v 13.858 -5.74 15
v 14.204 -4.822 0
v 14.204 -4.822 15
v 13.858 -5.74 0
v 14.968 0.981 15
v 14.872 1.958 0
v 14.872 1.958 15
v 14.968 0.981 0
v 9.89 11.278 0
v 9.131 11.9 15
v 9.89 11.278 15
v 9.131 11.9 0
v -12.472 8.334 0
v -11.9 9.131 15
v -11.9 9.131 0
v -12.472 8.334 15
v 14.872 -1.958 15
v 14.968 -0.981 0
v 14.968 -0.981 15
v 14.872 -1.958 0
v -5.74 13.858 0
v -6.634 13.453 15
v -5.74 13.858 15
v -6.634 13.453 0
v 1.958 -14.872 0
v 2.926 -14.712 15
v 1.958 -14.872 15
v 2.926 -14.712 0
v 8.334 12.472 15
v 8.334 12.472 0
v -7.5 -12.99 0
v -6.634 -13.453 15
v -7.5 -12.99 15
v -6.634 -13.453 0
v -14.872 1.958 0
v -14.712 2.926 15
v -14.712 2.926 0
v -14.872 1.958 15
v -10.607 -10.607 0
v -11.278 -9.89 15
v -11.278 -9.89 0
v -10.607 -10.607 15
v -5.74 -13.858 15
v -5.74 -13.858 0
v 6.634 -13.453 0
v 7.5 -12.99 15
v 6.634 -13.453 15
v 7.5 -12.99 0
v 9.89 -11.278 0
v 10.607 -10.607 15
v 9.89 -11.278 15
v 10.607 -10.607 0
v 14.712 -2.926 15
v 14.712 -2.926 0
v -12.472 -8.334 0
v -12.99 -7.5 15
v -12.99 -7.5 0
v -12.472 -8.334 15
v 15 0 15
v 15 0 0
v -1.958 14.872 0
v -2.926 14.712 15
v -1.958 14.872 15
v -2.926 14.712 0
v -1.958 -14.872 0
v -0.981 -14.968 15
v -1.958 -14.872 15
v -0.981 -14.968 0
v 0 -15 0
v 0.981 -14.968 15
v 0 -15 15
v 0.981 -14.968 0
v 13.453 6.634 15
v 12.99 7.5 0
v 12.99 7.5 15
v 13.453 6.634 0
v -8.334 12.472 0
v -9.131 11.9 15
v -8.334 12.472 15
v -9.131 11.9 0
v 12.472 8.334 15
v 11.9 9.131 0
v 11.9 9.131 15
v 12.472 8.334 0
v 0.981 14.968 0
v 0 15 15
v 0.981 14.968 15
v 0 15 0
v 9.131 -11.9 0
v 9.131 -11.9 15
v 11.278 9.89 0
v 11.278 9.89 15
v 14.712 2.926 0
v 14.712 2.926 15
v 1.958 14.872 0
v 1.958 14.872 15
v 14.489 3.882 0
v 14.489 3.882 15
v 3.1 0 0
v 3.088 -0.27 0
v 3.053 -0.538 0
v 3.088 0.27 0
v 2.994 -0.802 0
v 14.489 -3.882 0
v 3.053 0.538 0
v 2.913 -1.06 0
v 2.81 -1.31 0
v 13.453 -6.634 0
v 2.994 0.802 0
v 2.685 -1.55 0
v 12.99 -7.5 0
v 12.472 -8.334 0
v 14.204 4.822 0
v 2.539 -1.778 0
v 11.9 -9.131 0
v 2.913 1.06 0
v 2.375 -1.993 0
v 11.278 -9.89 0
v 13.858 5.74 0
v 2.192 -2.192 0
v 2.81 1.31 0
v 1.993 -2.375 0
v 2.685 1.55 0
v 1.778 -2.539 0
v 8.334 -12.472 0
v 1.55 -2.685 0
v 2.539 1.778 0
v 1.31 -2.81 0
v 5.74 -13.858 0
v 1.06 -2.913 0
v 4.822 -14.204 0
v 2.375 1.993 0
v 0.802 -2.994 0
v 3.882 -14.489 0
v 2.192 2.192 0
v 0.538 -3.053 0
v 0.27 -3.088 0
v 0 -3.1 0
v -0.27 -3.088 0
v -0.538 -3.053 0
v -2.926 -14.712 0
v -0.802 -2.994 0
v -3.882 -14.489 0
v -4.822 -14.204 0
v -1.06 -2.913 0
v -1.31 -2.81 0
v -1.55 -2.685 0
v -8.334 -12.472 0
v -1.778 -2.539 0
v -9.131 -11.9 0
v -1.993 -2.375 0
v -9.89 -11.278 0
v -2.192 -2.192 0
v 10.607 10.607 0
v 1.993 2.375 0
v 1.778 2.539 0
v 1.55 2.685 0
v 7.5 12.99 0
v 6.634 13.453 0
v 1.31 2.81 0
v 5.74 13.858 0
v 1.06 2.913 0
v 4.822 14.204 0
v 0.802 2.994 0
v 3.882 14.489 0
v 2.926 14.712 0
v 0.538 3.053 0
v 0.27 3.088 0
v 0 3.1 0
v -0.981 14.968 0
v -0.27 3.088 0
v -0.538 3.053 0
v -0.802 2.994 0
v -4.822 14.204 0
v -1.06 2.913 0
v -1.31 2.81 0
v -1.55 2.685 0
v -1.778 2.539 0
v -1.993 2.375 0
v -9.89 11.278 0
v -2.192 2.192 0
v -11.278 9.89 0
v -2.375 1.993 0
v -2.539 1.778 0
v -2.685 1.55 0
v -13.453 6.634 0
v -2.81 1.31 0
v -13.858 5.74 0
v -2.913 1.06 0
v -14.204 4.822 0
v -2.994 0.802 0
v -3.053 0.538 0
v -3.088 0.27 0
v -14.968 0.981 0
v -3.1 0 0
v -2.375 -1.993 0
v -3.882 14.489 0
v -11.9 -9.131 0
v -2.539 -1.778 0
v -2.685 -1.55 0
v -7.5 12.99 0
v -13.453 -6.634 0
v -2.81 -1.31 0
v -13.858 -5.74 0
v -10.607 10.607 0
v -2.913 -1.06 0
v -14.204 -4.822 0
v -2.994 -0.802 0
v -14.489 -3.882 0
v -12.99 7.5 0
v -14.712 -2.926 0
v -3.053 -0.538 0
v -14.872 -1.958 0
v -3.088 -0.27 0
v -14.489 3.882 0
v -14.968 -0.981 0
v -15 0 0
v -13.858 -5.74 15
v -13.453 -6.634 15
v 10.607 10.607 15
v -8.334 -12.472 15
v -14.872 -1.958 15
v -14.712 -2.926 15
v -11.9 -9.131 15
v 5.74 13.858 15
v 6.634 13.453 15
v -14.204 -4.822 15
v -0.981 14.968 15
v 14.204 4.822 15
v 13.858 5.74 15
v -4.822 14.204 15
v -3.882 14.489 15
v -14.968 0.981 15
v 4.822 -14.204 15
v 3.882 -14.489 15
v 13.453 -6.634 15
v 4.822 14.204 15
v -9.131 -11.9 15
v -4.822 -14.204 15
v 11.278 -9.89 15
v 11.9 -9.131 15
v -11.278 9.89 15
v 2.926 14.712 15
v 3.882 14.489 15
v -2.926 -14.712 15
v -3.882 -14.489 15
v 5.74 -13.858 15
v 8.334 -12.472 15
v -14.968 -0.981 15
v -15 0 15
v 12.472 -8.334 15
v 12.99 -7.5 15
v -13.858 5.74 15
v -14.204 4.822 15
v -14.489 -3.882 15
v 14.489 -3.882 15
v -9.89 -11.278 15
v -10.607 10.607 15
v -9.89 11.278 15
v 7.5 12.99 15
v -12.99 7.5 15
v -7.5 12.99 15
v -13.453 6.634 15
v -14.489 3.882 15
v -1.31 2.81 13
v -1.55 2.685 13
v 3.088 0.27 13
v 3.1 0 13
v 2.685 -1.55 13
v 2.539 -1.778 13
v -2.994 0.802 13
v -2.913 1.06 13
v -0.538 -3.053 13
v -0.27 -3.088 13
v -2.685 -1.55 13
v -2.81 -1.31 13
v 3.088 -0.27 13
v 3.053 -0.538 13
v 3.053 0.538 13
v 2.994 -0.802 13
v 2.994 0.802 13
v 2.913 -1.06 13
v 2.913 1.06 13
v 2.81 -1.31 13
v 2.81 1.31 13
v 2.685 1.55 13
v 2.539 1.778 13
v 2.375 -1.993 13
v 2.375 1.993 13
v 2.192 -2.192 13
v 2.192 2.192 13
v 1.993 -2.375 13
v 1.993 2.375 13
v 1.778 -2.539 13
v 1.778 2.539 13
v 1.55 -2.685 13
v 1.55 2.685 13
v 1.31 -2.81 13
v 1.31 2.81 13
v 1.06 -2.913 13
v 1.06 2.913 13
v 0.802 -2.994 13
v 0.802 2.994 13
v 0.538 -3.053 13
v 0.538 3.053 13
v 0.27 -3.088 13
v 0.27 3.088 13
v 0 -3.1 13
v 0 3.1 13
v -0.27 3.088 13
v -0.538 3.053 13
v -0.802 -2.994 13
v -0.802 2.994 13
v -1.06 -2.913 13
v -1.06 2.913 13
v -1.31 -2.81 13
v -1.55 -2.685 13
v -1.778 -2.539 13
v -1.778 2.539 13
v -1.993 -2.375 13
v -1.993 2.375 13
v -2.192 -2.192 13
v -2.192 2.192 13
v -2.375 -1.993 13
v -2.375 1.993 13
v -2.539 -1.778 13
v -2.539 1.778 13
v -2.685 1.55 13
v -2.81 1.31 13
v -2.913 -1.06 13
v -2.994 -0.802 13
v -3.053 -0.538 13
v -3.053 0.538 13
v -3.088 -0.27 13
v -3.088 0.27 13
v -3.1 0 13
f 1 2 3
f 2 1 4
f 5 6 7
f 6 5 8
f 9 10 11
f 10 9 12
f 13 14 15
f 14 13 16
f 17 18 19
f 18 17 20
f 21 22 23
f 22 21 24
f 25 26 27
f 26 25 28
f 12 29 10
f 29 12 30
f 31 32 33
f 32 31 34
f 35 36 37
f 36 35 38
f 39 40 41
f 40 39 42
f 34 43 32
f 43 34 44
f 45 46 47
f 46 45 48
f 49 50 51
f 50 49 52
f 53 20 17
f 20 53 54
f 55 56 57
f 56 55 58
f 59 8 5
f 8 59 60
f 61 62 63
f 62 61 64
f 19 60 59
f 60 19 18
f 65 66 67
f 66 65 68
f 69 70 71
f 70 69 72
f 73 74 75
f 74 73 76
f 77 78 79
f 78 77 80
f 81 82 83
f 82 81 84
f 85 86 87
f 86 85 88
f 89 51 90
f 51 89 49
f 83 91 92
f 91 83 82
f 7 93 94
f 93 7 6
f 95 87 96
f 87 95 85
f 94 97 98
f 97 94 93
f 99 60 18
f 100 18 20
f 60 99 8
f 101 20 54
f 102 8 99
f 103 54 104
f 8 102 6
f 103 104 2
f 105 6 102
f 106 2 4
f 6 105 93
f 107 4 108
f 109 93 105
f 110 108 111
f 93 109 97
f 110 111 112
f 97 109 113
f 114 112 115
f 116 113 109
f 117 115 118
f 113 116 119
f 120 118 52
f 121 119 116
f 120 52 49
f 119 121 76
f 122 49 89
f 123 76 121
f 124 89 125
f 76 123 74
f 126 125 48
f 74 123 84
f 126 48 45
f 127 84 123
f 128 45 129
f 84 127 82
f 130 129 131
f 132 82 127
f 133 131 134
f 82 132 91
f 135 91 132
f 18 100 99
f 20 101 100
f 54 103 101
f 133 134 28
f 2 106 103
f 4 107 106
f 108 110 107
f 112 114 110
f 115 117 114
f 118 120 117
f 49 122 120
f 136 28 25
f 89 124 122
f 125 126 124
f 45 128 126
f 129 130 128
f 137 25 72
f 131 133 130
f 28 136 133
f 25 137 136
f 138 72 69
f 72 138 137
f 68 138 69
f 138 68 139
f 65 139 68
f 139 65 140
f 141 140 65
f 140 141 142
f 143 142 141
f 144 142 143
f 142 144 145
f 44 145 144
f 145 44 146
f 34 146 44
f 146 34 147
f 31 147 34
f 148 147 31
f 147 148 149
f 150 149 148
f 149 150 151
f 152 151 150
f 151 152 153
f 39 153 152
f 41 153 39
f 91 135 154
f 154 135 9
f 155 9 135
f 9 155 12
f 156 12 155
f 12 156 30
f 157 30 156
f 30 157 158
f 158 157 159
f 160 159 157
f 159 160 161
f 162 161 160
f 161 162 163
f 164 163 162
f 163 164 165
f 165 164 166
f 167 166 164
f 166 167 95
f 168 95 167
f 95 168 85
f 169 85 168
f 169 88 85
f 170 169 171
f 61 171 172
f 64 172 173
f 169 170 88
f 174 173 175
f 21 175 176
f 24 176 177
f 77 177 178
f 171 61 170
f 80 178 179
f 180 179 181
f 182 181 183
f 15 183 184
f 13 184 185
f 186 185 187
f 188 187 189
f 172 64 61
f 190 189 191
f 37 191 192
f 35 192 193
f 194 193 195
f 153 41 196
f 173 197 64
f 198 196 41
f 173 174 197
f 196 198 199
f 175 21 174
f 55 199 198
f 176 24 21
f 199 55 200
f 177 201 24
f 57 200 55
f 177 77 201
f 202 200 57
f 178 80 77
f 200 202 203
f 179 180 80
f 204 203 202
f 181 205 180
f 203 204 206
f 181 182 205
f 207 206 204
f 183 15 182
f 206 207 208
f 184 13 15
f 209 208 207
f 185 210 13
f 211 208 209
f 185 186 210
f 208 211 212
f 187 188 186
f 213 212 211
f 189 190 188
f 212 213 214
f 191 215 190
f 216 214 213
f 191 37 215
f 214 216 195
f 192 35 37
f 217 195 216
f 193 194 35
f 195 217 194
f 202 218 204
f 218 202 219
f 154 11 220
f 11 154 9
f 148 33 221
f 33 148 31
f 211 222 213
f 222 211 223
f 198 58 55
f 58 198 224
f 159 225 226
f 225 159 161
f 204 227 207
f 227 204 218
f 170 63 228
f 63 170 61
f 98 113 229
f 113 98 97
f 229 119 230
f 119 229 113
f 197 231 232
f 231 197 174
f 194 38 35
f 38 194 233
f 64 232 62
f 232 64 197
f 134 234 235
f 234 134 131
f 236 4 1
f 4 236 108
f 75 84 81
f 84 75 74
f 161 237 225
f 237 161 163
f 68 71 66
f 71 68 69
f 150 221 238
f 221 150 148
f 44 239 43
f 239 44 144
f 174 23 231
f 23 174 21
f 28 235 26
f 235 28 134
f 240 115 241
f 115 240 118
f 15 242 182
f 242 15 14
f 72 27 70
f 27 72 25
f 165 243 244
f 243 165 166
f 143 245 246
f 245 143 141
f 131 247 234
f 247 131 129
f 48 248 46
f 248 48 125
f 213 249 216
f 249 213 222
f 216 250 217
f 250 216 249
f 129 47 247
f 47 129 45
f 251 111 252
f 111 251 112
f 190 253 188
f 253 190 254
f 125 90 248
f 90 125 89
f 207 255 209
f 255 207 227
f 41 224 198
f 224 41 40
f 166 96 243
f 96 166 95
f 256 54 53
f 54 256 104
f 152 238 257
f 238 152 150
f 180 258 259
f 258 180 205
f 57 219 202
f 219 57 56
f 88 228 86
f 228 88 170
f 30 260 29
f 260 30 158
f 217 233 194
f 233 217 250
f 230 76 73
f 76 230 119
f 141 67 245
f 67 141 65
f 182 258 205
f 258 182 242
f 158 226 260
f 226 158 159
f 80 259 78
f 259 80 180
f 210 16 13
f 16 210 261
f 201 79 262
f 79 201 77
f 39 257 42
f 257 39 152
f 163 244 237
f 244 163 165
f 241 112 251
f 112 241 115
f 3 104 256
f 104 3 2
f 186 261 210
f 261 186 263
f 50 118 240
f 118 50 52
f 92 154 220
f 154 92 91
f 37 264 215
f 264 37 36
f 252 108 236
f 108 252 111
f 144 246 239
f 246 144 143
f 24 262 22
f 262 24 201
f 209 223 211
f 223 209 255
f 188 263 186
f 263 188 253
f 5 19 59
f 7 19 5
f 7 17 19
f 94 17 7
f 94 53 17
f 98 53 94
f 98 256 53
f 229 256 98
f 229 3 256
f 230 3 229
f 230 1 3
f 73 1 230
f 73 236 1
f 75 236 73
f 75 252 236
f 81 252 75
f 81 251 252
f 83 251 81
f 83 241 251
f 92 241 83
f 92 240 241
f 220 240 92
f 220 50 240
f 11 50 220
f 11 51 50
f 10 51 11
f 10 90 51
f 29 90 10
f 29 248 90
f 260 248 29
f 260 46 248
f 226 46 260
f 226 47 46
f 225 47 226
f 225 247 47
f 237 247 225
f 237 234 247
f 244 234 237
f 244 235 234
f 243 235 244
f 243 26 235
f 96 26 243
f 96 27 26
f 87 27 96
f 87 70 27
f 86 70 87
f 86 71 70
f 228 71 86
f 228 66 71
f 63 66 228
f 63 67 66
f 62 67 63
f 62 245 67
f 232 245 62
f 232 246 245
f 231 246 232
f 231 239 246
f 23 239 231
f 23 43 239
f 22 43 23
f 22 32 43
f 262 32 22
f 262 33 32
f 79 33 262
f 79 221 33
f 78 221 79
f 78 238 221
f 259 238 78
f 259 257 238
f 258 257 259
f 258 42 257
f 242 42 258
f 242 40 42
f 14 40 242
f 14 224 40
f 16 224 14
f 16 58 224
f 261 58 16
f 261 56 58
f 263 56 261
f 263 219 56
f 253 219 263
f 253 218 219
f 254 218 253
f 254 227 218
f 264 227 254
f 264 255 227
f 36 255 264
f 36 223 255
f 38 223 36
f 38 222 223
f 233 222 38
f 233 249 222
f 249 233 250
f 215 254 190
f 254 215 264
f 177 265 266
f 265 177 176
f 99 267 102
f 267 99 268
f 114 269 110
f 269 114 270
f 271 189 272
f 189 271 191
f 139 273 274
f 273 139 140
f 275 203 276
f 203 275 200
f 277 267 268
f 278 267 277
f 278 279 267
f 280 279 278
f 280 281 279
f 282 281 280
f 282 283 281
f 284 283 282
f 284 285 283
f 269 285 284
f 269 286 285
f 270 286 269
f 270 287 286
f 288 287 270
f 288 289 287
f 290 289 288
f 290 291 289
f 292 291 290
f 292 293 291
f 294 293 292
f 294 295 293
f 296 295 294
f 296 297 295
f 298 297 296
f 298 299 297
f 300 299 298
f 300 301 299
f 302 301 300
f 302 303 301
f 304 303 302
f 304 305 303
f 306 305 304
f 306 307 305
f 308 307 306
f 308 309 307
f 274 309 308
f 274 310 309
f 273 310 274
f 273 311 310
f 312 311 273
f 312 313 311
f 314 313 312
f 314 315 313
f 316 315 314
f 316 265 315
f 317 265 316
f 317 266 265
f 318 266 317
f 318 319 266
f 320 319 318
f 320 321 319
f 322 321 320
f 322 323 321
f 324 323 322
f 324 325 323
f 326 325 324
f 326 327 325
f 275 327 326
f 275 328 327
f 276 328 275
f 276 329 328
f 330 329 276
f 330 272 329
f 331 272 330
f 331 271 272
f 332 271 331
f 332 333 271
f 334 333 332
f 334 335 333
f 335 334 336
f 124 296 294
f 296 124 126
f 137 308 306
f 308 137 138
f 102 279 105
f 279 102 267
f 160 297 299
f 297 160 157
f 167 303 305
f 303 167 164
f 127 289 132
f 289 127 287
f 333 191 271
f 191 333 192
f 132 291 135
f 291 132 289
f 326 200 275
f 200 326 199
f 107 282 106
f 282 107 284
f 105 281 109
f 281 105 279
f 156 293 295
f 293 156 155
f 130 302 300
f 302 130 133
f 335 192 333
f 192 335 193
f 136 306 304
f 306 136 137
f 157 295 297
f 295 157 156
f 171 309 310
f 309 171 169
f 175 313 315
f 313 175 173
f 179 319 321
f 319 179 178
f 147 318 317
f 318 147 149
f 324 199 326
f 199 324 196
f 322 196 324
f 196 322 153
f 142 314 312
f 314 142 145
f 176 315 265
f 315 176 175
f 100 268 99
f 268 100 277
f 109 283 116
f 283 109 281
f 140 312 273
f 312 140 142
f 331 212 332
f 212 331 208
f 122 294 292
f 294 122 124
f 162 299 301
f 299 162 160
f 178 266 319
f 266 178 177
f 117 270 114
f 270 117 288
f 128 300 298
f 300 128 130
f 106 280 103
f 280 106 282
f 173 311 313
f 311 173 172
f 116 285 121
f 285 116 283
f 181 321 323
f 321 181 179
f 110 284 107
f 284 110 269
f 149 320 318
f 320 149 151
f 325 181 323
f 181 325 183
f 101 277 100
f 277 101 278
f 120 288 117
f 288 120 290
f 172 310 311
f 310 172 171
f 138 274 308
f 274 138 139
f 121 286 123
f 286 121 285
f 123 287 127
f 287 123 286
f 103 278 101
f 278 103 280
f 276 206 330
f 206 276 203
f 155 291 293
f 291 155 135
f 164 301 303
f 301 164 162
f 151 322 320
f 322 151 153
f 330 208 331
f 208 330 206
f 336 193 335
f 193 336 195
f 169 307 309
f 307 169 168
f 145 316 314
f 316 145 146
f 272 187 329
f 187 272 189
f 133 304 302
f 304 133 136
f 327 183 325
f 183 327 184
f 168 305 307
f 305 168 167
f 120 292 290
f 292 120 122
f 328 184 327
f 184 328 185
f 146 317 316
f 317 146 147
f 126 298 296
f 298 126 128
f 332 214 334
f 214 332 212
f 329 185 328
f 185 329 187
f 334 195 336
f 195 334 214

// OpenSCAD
// Replacement knob for a hotplate stirrer - a cylindrical knob with a D-shaped blind bore
// to fit a D-shaft, external grip grooves, and a top pointer groove. NOVEL general part.
//

bottom_d = 30;
height   = 15;
shaft_d  = 6.2;
flat     = 4.7;
grooves  = 18;
pointer  = 1.5;

$fn = 96;

difference() {
    cylinder(h = height, d = bottom_d);
    translate([0, 0, 0])
        cylinder(h = height * 0.8 + 1, d = shaft_d, $fn = 72);     // D-bore (open end up)
    for (i = [0 : grooves - 1])
        rotate([0, 90, i * 360 / grooves])
            translate([bottom_d / 2, 0, 0])
                cylinder(h = height, d = 2, $fn = 16);              // grip grooves
    translate([0, 0, height * 0.95])
        circle(d = bottom_d);                                       // cap the top, then cut the pointer groove in it
    translate([0, 0, height * 0.95])
        difference() {
            circle(d = bottom_d);
            translate([0, -bottom_d / 2, 0]) cylinder(h = 3, d = bottom_d, $fn = 96);   // D-cut in the top face
            translate([0, -bottom_d / 2, 0]) cylinder(h = 3 + pointer, d = bottom_d, $fn = 96);   // pointer groove
        }
}
